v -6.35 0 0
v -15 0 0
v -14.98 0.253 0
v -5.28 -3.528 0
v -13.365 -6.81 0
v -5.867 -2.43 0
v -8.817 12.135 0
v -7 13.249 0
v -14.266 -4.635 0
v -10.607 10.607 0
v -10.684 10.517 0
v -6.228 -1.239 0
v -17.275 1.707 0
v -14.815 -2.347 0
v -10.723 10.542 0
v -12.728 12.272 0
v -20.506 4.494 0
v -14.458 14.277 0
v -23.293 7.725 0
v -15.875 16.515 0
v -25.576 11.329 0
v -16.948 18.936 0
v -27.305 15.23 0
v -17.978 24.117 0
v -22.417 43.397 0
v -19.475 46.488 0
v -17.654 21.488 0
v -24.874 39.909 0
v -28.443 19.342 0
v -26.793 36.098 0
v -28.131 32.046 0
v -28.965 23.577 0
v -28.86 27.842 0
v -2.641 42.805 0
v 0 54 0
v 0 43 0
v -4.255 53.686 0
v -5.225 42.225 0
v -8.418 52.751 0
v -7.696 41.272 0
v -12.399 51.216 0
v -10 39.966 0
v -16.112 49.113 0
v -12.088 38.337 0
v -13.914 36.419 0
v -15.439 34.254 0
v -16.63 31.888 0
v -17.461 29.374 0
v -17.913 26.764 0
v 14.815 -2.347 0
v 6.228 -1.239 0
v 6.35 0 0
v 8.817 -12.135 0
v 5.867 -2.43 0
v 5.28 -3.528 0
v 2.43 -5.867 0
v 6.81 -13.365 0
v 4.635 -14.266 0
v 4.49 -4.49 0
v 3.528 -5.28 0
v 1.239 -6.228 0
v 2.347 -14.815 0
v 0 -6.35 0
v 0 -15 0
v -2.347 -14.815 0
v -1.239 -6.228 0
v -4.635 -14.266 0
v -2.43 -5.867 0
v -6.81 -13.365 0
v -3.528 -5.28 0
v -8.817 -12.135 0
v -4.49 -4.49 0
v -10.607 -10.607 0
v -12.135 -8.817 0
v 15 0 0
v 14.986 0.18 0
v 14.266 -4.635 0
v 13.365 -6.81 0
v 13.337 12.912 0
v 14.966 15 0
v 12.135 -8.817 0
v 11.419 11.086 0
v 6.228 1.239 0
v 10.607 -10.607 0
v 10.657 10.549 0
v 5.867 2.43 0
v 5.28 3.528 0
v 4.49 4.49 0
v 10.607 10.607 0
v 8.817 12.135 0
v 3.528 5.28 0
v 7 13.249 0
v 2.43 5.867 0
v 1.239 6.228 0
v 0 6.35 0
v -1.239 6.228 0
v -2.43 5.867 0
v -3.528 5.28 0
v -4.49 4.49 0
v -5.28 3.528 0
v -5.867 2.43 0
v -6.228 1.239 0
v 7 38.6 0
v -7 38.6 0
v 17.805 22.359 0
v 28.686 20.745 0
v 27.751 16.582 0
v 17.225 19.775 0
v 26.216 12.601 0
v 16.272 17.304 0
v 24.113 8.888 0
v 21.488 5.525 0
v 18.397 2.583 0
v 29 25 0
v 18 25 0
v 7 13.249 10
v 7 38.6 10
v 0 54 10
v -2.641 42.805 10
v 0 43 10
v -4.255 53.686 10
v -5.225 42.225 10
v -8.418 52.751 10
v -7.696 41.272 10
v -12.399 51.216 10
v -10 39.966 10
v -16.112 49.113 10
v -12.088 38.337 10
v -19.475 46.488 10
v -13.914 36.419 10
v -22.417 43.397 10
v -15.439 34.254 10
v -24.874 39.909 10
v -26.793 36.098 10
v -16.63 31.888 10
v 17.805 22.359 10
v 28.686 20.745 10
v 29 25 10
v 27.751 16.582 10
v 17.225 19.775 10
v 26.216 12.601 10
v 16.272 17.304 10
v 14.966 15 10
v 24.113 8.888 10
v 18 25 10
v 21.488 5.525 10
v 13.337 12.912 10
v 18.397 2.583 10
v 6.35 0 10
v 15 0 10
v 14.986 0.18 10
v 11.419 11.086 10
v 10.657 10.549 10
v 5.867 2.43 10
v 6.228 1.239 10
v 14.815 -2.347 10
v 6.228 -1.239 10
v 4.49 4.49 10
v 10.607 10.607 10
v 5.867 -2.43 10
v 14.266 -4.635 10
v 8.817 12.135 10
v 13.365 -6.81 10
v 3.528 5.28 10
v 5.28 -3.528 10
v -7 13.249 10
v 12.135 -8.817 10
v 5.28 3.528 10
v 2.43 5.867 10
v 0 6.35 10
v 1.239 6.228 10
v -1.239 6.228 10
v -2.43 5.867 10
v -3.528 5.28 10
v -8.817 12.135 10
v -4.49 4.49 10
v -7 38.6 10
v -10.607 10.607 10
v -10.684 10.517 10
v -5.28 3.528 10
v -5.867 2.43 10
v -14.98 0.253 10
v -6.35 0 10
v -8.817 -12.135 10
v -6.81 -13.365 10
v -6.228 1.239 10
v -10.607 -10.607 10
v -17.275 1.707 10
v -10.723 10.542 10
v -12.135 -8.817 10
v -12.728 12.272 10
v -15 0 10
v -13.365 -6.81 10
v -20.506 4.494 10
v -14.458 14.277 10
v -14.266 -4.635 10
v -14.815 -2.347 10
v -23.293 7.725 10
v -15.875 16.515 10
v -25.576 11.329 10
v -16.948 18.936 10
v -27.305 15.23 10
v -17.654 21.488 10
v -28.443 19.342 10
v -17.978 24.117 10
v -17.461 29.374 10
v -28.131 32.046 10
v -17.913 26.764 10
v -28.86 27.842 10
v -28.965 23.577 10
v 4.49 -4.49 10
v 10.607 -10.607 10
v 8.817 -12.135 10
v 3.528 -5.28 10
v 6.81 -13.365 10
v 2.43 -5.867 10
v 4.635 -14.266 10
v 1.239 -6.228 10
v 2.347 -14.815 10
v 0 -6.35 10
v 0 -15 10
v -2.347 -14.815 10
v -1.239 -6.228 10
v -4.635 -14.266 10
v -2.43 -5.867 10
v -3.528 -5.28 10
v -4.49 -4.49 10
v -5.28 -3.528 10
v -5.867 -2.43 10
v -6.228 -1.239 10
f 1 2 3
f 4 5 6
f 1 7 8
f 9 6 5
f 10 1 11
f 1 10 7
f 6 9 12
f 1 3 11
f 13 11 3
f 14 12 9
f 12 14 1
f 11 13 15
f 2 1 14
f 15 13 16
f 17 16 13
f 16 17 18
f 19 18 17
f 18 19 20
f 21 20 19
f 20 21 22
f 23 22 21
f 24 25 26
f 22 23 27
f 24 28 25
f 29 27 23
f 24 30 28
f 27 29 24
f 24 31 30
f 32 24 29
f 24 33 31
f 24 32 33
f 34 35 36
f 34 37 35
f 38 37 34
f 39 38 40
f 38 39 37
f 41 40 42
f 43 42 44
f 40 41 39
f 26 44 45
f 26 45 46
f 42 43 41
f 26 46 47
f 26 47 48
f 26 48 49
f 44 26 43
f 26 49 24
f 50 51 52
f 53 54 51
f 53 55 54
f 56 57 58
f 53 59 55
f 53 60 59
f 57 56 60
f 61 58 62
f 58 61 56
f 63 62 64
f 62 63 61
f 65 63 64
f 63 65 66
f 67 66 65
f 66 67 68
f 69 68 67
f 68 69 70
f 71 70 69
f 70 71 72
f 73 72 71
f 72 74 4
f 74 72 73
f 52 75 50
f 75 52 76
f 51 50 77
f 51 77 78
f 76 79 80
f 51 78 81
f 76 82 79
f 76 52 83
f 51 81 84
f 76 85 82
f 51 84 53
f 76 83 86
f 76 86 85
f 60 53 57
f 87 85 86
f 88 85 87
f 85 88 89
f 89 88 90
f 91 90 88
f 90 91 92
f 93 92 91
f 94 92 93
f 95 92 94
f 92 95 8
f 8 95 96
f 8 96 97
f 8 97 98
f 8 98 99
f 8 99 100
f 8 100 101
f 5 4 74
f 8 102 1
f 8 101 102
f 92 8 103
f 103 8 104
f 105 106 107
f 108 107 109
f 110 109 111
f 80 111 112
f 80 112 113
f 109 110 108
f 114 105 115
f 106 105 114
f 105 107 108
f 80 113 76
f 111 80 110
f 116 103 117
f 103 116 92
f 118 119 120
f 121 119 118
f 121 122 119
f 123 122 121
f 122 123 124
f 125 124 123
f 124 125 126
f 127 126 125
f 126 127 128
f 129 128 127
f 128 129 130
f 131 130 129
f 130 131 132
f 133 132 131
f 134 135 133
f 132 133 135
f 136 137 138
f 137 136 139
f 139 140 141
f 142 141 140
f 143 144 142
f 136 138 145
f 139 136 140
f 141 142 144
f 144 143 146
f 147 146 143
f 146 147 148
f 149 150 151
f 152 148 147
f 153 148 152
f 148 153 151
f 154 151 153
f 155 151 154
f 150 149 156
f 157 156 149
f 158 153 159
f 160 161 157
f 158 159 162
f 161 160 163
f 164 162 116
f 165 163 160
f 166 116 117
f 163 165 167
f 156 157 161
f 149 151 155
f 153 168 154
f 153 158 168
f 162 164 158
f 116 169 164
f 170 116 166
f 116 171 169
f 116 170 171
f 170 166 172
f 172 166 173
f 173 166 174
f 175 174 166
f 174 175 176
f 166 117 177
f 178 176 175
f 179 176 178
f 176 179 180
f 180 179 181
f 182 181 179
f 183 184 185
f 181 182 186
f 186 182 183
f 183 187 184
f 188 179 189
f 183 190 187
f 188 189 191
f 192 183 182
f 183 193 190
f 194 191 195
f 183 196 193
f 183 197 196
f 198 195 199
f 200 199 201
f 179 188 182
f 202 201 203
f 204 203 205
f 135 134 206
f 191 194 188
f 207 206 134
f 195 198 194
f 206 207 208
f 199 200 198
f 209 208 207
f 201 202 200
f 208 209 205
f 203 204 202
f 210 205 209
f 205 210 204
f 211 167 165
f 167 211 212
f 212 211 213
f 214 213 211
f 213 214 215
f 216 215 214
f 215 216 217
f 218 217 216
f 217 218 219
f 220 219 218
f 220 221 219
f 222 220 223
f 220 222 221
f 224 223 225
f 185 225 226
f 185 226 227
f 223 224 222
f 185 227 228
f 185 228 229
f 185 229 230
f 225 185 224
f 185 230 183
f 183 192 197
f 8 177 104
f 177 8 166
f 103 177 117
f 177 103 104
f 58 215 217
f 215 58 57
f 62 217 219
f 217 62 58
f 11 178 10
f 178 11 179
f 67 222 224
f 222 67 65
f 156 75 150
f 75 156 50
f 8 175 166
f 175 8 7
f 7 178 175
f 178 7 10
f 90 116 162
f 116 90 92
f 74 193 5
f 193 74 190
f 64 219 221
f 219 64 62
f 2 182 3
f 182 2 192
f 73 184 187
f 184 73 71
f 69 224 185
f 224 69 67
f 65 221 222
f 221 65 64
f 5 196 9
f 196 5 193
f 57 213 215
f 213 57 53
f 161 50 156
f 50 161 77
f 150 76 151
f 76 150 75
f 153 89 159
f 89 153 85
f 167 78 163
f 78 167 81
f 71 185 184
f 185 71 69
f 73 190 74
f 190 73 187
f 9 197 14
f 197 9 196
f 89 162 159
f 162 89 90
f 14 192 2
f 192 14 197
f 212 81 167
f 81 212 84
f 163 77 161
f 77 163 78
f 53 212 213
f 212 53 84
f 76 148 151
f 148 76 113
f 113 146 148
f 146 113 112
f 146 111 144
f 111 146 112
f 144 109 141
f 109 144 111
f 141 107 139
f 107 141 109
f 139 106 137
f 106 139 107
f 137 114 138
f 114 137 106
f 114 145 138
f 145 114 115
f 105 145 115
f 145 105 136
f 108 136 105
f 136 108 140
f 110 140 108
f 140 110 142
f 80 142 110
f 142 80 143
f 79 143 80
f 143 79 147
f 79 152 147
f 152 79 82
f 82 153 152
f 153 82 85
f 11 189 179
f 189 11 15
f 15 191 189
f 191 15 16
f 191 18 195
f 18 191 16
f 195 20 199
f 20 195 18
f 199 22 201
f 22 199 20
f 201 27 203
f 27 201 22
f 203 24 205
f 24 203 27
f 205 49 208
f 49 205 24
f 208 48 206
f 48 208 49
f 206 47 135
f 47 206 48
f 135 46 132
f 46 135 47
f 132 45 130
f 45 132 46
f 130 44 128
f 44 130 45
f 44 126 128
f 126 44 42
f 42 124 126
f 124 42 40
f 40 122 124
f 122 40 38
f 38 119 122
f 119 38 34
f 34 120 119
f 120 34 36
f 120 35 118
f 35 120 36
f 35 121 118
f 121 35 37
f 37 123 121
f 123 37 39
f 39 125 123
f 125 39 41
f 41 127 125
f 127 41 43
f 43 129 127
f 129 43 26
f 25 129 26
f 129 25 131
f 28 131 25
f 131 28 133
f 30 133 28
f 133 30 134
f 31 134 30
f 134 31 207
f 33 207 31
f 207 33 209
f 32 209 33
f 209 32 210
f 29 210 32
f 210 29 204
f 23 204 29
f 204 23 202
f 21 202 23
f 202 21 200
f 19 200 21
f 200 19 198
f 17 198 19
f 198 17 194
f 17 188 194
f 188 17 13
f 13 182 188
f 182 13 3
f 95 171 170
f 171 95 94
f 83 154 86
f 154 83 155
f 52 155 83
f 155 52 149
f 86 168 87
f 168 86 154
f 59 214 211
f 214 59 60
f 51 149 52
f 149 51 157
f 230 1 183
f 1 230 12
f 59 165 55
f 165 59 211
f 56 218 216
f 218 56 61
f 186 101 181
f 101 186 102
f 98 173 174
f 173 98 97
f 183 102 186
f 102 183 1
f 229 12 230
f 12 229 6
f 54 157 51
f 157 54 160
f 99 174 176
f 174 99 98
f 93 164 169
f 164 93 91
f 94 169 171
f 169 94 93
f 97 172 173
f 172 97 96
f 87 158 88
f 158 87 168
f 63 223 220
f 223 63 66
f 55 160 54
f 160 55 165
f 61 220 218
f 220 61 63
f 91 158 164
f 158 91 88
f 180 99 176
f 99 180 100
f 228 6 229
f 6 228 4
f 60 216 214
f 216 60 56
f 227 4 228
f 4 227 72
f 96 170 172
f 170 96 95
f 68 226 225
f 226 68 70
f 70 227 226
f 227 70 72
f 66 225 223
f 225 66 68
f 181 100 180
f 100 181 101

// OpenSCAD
$fn = 32;

// ----------------------------------------------------------------------
// Hook: 50 mm shank into a 18 mm curl, 10 mm thick
// ----------------------------------------------------------------------

// --- parameters (mm) ---
shank_len = 50;           // shank length from the boss centre
shank_w = 14;             // shank width
boss_d = 30;              // boss diameter
bore_d = 12.7;            // boss bore
curl_in = 18;             // curl inner radius
curl_out = 29;            // curl outer radius
curl_sweep = 270;         // curl sweep angle
hook_t = 10;              // hook thickness

shank_profile = [[-7, 38.6], [7, 38.6], [7, 13], [-7, 13]];
boss_profile = [[15, 0], [14.815, 2.347], [14.266, 4.635], [13.365, 6.81], [12.135, 8.817], [10.607, 10.607], [8.817, 12.135], [6.81, 13.365], [4.635, 14.266], [2.347, 14.815], [0, 15], [-2.347, 14.815], [-4.635, 14.266], [-6.81, 13.365], [-8.817, 12.135], [-10.607, 10.607], [-12.135, 8.817], [-13.365, 6.81], [-14.266, 4.635], [-14.815, 2.347], [-15, 0], [-14.815, -2.347], [-14.266, -4.635], [-13.365, -6.81], [-12.135, -8.817], [-10.607, -10.607], [-8.817, -12.135], [-6.81, -13.365], [-4.635, -14.266], [-2.347, -14.815], [0, -15], [2.347, -14.815], [4.635, -14.266], [6.81, -13.365], [8.817, -12.135], [10.607, -10.607], [12.135, -8.817], [13.365, -6.81], [14.266, -4.635], [14.815, -2.347]];
curl_profile = [[0, 54], [-4.255, 53.686], [-8.418, 52.751], [-12.399, 51.216], [-16.112, 49.113], [-19.475, 46.488], [-22.417, 43.397], [-24.874, 39.909], [-26.793, 36.098], [-28.131, 32.046], [-28.86, 27.842], [-28.965, 23.577], [-28.443, 19.342], [-27.305, 15.23], [-25.576, 11.329], [-23.293, 7.725], [-20.506, 4.494], [-17.275, 1.707], [-13.671, -0.576], [-9.77, -2.305], [-5.658, -3.443], [-1.423, -3.965], [2.842, -3.86], [7.046, -3.131], [11.098, -1.793], [14.909, 0.126], [18.397, 2.583], [21.488, 5.525], [24.113, 8.888], [26.216, 12.601], [27.751, 16.582], [28.686, 20.745], [29, 25], [18, 25], [17.805, 22.359], [17.225, 19.775], [16.272, 17.304], [14.966, 15], [13.337, 12.912], [11.419, 11.086], [9.254, 9.561], [6.888, 8.37], [4.374, 7.539], [1.764, 7.087], [-0.883, 7.022], [-3.512, 7.346], [-6.064, 8.052], [-8.485, 9.125], [-10.723, 10.542], [-12.728, 12.272], [-14.458, 14.277], [-15.875, 16.515], [-16.948, 18.936], [-17.654, 21.488], [-17.978, 24.117], [-17.913, 26.764], [-17.461, 29.374], [-16.63, 31.888], [-15.439, 34.254], [-13.914, 36.419], [-12.088, 38.337], [-10, 39.966], [-7.696, 41.272], [-5.225, 42.225], [-2.641, 42.805], [0, 43]];

difference() {
  union() {
    /* three overlapping outlines: shank, boss and the smooth curl */
    linear_extrude(height = hook_t) polygon(shank_profile);
    linear_extrude(height = hook_t) polygon(boss_profile);
    linear_extrude(height = hook_t) polygon(curl_profile);
  }
  translate([0, 0, -2.5]) cylinder(h = hook_t + 5, d = bore_d);
}
